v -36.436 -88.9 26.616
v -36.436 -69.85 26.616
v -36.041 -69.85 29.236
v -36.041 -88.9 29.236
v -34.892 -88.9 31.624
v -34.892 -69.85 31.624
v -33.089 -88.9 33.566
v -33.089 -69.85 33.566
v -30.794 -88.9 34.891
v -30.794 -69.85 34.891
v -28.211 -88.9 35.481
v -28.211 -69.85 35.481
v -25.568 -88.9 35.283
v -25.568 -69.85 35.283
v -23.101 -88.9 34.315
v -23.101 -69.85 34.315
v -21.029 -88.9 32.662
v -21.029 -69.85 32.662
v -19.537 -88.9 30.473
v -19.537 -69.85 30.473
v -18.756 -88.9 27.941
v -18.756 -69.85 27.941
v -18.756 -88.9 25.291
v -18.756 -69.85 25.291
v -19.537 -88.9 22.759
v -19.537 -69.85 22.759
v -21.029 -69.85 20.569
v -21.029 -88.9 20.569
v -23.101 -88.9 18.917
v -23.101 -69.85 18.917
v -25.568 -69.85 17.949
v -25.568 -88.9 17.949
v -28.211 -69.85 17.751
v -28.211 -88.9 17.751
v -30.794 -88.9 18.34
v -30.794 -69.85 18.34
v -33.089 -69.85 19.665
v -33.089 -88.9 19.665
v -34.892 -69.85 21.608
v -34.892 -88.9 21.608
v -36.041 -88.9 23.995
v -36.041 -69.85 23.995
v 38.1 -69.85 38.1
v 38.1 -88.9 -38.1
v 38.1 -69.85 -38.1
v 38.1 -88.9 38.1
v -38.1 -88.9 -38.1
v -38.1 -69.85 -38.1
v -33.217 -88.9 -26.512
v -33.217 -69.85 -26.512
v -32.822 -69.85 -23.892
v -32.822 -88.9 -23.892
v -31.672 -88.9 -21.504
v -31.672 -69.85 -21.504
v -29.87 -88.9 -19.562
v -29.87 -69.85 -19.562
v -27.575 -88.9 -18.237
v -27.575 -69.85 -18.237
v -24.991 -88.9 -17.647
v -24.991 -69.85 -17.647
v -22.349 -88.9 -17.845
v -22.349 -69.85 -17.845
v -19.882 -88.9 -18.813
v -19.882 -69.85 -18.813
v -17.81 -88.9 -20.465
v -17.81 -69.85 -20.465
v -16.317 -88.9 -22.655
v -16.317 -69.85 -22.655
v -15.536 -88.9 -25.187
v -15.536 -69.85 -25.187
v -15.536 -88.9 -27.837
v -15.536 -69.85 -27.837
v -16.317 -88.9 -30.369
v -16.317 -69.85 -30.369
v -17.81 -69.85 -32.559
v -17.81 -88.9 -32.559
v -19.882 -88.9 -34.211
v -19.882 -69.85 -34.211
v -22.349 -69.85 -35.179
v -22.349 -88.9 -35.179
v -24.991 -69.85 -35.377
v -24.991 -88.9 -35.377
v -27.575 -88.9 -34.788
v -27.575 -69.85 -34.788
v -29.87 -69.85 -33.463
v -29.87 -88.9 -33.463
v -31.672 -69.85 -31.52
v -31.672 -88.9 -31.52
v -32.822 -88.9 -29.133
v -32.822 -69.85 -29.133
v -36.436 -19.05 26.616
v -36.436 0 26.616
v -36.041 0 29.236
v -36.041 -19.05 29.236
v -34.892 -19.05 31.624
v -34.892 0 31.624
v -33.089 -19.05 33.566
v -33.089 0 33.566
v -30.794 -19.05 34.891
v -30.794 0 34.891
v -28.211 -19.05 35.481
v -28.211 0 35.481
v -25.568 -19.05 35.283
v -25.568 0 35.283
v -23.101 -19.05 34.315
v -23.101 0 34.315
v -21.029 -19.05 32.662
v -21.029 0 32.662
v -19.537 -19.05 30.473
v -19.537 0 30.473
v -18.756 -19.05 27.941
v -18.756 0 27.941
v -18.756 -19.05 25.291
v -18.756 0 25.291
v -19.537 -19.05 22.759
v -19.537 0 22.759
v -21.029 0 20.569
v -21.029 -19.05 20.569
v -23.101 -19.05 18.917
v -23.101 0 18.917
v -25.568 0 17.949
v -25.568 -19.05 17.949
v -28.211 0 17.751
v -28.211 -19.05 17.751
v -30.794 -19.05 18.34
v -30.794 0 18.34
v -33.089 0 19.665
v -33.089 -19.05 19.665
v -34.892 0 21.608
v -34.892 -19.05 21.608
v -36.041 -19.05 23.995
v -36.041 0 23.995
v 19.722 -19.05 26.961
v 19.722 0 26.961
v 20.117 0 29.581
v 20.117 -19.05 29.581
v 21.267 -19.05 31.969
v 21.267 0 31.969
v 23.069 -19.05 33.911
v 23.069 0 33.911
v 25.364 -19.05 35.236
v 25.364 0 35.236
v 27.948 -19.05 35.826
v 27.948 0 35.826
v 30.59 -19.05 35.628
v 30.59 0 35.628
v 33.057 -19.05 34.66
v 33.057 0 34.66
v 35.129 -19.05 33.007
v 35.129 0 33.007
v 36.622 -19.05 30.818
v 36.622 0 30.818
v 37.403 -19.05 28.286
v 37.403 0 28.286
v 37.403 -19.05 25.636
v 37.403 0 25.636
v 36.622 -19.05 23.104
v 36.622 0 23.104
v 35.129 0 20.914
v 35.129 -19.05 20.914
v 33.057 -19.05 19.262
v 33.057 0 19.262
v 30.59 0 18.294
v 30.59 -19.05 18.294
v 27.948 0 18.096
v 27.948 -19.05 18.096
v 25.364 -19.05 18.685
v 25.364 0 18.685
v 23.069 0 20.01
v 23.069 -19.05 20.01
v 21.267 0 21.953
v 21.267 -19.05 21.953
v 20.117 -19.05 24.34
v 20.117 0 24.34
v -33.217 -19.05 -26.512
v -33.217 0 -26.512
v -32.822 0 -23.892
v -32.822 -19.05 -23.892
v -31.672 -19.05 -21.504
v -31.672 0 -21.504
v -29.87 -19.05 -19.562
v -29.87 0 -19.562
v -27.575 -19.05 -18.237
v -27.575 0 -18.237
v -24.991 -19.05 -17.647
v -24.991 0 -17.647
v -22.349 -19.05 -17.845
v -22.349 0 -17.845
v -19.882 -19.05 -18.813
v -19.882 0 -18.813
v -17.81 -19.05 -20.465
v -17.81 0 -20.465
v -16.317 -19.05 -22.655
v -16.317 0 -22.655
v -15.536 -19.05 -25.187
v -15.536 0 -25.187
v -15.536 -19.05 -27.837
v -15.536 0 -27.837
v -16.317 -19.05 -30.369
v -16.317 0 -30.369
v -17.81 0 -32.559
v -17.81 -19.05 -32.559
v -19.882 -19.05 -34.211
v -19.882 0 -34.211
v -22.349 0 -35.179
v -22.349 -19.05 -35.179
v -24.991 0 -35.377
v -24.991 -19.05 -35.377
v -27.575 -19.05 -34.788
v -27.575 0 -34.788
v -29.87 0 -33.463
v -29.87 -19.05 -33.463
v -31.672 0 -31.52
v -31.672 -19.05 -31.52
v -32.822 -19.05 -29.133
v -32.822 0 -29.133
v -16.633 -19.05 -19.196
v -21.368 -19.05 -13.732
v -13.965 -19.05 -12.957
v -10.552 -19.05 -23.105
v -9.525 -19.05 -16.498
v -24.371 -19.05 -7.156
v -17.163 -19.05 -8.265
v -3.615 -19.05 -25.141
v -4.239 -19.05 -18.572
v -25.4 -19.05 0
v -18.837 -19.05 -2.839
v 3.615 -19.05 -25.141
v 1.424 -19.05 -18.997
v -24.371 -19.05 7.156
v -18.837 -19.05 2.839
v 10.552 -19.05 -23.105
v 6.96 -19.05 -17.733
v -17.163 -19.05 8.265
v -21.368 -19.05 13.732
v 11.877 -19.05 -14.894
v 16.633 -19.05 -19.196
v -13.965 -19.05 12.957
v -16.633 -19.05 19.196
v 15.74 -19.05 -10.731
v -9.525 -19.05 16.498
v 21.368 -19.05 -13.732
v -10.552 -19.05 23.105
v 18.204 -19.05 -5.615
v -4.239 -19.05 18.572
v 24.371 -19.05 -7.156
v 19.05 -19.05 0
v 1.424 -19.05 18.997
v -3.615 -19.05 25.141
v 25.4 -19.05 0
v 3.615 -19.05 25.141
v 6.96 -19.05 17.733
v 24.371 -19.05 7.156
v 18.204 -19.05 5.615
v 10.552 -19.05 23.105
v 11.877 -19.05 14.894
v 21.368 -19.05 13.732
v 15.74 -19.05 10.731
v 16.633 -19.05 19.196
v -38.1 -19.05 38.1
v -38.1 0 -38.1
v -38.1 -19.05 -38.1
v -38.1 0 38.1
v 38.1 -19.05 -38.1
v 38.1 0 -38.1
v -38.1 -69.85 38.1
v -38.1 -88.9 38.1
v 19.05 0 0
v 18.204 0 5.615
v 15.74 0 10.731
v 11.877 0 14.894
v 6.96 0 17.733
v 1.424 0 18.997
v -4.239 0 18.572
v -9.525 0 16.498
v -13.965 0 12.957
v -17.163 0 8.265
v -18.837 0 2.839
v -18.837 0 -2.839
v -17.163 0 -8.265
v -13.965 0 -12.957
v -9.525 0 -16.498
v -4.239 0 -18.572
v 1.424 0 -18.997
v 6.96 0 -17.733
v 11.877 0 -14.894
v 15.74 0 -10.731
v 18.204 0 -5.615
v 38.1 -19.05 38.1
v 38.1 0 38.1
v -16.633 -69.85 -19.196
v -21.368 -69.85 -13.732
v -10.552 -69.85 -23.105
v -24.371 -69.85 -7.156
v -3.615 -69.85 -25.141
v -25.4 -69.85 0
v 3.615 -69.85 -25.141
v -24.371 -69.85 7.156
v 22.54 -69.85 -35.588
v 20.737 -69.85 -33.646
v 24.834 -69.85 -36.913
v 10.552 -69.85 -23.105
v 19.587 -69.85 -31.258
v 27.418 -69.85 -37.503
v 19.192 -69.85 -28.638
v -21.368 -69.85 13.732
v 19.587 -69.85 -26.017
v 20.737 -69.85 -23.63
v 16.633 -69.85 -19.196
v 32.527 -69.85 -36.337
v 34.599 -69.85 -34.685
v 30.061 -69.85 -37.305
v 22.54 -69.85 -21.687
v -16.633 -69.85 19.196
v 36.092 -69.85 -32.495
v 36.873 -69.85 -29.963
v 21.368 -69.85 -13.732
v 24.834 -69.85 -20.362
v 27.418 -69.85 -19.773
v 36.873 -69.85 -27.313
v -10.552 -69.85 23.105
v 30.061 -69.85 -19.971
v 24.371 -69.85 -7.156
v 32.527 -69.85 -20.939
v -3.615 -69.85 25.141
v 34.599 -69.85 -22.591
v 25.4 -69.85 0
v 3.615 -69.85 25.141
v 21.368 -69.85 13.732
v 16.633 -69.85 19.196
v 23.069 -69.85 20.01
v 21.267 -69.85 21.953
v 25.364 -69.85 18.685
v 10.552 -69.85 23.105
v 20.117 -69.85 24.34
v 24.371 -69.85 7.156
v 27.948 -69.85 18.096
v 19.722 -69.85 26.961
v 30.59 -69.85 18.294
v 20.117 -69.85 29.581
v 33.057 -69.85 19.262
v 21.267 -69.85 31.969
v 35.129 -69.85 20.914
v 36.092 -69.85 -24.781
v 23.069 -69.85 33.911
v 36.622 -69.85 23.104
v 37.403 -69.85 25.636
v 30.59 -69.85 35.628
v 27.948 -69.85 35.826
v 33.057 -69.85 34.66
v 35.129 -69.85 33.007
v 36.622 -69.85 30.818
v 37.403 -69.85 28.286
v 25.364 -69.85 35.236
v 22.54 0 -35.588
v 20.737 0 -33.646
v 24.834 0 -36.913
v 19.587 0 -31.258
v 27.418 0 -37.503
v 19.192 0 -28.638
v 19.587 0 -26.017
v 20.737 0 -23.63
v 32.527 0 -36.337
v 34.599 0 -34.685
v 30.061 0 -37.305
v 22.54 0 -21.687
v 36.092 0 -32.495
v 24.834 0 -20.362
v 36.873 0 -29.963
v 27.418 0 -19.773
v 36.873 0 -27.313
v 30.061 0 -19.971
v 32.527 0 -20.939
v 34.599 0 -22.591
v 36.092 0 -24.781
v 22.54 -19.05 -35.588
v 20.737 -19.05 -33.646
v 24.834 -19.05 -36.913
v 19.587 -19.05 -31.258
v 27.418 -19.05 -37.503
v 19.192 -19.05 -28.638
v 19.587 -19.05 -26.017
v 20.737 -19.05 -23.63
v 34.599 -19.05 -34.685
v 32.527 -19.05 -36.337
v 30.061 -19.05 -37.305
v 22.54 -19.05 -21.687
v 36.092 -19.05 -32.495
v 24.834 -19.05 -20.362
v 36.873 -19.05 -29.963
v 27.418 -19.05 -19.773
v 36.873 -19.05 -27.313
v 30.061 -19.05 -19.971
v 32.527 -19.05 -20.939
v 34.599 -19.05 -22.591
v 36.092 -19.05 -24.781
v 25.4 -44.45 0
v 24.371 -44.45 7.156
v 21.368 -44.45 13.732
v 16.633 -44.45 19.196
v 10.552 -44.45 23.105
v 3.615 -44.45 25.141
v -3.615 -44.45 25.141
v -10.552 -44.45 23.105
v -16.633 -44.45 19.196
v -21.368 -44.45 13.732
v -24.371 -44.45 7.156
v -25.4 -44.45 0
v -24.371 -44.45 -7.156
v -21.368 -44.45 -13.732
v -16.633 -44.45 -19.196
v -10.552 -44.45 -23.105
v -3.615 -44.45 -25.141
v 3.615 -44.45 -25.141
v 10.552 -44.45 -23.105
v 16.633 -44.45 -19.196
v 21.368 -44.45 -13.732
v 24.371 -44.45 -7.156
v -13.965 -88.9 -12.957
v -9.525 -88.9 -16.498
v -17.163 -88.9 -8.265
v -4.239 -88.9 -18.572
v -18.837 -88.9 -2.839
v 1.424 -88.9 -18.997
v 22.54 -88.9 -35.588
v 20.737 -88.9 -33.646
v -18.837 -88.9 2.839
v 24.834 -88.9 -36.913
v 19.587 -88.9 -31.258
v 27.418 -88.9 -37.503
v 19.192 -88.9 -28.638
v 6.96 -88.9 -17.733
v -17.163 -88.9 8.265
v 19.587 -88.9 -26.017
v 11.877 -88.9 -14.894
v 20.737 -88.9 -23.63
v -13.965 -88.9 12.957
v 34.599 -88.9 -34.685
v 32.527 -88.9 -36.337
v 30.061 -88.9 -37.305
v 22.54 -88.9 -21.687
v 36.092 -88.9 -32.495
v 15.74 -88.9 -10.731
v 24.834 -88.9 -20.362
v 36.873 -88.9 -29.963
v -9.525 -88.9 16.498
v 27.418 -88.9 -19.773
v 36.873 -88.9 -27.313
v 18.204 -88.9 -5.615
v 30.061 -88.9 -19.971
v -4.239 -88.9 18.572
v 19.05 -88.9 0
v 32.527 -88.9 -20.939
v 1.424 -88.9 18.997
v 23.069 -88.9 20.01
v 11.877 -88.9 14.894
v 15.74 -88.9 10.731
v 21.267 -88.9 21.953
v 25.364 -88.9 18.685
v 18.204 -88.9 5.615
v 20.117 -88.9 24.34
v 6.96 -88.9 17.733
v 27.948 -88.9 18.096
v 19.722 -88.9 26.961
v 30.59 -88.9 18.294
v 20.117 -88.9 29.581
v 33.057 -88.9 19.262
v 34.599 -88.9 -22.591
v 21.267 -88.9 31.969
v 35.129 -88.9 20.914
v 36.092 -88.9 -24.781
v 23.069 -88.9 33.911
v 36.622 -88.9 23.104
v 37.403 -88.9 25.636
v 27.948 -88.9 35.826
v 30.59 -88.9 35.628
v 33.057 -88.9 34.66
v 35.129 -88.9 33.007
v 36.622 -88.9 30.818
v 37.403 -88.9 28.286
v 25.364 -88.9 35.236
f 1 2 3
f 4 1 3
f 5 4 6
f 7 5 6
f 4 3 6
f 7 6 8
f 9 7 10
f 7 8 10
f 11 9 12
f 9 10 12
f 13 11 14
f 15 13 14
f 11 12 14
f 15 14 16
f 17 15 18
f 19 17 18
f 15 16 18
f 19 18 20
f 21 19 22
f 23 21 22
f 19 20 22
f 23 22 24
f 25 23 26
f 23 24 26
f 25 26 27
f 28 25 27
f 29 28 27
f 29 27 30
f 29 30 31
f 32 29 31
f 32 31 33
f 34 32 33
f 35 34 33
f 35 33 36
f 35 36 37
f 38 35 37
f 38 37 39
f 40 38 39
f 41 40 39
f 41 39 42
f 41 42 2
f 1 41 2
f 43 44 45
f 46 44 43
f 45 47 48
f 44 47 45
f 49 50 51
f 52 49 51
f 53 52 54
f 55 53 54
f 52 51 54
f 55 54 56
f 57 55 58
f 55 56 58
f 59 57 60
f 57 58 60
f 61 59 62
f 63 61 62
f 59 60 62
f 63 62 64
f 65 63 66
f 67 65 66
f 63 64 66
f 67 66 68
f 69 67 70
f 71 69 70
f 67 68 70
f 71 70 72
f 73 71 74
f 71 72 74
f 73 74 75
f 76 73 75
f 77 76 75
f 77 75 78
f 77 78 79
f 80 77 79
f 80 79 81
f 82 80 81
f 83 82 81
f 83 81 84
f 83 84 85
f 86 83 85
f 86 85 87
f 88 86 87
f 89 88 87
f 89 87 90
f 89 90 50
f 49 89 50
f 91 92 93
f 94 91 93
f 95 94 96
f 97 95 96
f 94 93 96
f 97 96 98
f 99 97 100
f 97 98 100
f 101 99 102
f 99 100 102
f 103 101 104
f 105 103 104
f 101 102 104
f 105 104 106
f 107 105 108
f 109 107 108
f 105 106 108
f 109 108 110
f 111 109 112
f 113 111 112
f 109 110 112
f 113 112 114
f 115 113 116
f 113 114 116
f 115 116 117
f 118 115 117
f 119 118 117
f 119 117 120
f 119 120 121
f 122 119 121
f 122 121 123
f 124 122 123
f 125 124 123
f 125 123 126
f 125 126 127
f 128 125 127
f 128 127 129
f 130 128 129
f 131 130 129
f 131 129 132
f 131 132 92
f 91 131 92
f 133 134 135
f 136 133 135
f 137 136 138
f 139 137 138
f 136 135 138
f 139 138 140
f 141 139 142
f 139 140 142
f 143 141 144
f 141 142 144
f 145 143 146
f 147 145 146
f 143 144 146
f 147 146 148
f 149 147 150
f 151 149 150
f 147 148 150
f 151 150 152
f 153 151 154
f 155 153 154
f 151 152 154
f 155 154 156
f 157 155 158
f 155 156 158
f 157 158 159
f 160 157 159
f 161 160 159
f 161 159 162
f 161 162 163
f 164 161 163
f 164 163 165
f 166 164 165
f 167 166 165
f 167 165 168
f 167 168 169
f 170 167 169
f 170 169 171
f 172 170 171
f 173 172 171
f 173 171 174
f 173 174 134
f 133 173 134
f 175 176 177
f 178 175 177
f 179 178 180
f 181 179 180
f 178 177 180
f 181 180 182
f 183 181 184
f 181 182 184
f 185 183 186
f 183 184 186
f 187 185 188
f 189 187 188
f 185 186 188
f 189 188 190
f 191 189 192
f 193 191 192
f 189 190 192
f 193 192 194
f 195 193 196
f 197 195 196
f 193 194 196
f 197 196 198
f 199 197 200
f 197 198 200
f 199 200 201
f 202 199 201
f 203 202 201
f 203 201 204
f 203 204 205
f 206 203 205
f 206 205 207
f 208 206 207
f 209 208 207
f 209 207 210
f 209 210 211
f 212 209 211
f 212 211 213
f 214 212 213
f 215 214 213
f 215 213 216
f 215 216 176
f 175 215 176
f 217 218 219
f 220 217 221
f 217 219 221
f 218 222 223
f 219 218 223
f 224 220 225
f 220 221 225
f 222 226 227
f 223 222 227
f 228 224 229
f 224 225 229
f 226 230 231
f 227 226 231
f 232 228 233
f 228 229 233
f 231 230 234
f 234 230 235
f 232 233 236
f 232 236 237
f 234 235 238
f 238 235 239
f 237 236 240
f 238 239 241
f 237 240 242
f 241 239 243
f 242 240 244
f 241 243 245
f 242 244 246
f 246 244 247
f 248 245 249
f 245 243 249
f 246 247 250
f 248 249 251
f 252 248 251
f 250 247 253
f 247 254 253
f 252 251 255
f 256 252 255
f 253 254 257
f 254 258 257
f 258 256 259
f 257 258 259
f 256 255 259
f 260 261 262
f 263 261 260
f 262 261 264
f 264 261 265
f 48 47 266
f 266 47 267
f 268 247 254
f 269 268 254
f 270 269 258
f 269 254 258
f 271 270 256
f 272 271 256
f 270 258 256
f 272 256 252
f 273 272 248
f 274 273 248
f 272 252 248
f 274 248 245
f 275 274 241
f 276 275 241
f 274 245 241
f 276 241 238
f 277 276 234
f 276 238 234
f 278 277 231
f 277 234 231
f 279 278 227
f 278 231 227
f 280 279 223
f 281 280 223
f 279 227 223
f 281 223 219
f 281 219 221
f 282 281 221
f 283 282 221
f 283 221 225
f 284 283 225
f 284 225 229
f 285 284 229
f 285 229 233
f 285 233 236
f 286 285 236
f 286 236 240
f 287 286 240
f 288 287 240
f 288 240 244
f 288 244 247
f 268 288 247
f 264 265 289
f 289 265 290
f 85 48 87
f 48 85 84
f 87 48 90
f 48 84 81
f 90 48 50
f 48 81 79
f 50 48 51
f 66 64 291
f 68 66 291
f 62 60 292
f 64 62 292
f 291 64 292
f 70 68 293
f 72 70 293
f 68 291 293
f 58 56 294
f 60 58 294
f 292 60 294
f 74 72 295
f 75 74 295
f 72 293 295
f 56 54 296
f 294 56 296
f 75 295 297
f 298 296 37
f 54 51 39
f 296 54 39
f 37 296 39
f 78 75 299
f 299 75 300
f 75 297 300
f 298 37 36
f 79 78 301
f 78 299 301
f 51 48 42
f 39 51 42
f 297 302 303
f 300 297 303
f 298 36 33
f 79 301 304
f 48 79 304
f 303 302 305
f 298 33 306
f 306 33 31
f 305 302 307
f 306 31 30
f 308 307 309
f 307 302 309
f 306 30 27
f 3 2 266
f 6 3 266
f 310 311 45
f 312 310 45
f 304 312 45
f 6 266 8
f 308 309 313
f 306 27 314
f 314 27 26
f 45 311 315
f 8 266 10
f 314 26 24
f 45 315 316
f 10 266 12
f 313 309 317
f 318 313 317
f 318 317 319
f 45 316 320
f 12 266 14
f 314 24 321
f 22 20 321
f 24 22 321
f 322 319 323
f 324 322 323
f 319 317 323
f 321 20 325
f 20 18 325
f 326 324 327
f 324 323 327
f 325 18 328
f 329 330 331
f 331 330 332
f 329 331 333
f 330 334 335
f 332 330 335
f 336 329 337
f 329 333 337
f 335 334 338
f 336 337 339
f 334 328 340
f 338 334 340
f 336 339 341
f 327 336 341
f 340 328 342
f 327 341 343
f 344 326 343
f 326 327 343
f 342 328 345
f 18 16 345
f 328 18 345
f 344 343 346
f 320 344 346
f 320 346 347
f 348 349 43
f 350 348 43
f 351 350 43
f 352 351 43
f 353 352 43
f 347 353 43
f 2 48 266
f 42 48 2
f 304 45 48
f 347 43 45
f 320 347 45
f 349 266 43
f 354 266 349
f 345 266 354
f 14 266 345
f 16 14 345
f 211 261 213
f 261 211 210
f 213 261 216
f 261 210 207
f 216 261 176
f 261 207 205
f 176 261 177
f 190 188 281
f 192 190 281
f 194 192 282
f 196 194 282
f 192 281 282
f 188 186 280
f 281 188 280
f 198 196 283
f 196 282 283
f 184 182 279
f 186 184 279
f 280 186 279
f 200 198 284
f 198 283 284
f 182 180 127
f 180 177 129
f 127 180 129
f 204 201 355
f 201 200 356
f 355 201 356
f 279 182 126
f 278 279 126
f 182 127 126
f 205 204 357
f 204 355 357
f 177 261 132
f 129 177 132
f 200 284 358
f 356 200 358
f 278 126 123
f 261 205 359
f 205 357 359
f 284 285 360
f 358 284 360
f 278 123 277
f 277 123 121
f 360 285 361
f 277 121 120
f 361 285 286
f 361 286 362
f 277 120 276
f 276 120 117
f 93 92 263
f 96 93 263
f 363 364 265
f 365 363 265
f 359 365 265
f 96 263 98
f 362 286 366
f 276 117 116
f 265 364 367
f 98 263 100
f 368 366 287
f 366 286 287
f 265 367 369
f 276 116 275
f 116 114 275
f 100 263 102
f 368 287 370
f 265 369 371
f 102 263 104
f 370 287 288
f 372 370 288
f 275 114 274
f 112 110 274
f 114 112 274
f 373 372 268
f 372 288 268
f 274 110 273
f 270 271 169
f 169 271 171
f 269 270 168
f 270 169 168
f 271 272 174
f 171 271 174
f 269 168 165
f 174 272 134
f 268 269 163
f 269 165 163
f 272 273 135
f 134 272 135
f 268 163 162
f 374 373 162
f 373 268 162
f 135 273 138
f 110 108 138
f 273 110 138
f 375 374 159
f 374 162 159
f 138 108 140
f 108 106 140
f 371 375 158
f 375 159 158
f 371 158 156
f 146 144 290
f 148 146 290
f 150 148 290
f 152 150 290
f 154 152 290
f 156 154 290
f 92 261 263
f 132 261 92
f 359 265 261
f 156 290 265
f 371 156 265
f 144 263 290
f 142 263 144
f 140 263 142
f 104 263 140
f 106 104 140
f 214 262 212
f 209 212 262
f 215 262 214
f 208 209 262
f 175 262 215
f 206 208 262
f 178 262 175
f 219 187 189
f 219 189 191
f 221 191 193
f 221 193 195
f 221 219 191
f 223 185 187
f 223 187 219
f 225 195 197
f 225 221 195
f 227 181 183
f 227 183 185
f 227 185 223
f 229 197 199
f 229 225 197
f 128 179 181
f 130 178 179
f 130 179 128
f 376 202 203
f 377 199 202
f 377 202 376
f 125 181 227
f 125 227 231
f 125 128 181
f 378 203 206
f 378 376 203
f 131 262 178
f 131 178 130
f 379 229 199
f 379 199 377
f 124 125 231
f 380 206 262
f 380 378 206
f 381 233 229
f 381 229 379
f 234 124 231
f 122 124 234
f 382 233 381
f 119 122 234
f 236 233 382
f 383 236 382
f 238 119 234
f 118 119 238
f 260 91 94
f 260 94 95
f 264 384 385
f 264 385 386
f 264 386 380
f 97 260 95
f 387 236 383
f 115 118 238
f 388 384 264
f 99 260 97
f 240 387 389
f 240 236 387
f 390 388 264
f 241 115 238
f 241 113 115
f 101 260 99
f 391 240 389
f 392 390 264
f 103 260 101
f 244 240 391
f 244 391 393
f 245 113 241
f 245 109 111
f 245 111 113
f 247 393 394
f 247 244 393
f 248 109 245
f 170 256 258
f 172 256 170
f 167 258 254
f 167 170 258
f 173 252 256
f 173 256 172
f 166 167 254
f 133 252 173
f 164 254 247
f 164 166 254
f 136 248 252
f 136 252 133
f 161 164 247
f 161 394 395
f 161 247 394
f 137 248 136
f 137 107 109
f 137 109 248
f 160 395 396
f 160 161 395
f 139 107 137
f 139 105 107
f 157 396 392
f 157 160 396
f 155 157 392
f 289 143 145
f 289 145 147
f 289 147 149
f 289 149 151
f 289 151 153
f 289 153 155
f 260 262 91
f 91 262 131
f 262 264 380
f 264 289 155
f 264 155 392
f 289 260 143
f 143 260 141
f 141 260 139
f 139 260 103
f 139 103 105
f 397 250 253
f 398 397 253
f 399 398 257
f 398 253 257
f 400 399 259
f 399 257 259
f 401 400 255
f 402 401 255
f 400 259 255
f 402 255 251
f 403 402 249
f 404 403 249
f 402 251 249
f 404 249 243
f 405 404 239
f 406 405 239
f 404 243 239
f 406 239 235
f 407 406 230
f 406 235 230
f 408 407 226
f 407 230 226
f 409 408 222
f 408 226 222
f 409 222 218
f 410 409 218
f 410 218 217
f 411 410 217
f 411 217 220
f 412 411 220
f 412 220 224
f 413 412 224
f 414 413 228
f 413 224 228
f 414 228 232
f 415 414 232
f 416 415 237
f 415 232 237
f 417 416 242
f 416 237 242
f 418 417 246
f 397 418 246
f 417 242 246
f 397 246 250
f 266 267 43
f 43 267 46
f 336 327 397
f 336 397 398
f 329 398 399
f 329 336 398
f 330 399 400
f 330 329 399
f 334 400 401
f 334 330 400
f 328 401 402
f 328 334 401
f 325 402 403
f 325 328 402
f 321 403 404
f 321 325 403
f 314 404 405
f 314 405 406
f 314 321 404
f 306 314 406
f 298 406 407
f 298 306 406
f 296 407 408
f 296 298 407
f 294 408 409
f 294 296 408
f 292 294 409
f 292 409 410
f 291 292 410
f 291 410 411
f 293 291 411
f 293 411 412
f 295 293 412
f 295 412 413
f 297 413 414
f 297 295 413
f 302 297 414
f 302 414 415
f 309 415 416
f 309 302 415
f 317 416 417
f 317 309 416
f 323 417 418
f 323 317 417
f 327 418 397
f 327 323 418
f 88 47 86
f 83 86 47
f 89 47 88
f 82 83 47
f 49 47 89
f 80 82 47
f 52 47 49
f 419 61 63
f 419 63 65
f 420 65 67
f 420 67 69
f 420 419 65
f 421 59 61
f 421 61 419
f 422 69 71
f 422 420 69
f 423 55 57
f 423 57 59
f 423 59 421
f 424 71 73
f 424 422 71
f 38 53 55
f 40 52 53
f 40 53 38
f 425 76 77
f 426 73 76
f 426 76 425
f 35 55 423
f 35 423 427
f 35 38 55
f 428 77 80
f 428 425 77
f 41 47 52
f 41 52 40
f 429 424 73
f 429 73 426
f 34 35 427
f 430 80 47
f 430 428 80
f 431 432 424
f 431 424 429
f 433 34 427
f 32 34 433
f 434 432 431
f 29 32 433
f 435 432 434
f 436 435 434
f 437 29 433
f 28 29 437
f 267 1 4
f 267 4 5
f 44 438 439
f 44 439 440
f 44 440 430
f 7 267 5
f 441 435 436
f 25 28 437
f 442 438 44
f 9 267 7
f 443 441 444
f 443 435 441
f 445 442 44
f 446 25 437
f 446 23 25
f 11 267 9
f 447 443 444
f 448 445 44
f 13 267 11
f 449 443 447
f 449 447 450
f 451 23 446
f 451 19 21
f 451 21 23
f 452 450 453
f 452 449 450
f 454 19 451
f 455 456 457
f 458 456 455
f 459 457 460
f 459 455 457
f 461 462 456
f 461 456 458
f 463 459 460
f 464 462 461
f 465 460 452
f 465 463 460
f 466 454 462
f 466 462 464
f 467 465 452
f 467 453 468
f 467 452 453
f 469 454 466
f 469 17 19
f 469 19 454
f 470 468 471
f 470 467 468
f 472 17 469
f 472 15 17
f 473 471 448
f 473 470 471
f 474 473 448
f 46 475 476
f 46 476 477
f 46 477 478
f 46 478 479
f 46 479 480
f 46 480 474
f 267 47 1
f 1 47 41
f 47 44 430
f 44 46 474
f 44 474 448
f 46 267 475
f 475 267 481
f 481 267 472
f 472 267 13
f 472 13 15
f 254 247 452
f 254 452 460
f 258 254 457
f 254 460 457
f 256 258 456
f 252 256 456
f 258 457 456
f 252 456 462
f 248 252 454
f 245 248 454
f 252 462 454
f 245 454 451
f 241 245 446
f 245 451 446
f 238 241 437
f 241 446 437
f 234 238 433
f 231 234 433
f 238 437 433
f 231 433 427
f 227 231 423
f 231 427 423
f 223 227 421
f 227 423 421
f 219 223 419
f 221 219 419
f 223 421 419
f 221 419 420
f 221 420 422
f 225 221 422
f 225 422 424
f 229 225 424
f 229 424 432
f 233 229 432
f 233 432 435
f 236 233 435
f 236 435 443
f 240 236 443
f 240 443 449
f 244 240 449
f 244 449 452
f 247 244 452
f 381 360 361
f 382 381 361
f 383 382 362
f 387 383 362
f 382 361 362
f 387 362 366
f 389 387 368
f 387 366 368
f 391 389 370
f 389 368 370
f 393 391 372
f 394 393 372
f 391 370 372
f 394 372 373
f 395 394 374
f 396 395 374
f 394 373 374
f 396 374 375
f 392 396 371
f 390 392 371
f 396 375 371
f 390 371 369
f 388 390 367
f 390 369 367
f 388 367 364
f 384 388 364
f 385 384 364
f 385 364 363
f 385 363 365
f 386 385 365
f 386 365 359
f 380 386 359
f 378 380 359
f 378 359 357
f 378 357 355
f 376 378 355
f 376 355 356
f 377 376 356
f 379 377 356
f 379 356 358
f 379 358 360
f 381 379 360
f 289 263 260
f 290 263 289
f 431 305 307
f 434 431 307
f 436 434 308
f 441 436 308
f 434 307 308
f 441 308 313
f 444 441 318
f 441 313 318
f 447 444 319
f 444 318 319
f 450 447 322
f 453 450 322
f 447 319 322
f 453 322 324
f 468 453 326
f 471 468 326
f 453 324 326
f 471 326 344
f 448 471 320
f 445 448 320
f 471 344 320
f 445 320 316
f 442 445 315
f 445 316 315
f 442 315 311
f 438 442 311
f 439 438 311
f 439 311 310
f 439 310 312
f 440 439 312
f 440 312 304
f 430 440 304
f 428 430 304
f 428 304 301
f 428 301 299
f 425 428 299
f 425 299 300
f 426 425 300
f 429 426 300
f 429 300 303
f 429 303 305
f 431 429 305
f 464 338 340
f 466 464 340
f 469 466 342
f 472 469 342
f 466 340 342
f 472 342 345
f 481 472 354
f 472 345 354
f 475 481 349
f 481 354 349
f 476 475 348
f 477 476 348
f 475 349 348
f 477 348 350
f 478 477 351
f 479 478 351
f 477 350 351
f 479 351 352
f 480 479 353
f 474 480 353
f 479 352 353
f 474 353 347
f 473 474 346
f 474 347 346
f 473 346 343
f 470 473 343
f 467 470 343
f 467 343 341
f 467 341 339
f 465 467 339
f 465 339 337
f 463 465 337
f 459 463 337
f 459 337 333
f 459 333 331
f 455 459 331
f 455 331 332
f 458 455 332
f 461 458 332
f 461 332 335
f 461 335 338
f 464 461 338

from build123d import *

# Parameters (mm, degrees)
F0_W     = 76.2
F0_H     = 76.2
F1_DEPTH = 19.05
F2_R     = 25.4
F3_DEPTH = 25.4
F6_D     = 38.1
F6_2_D   = 38.1
F8_D     = 17.78
F8_2_D   = 17.78
F10_D    = 17.78
F10_2_D  = 17.78
F12_D    = 17.78
F12_2_D  = 17.78
F14_D    = 17.78
F14_2_D  = 17.78


with BuildPart() as f1:
    # F0 (on Front) → F1 (new body)
    with BuildSketch(Plane.XZ):
        Rectangle(F0_W, F0_H)
    extrude(amount=F1_DEPTH)


with BuildPart() as f3:
    # F2 (on face) → F3 (new body)
    with BuildSketch(Plane.XZ.offset(19.05)):
        Circle(F2_R)
    extrude(amount=F3_DEPTH)



with BuildPart() as f3_1:
    add(f3.part)
    # F5: F1, F3 across face
    add(f1.part.mirror(Plane.XZ.offset(44.45)))
    add(f3.part.mirror(Plane.XZ.offset(44.45)))

    # F6#2 (through all)
    with Locations(Plane(origin=(0, 0, 0), x_dir=(-1, 0, 0), z_dir=(0, 1, 0))):
        with Locations((0, 0)):
            Hole(F6_2_D / 2)

    # F8#2 (through all)
    with Locations(Plane.XZ.offset(88.9)):
        with Locations((28.0823782086, -28.6378357559)):
            Hole(F8_2_D / 2)

    # F10#2 (through all)
    with Locations(Plane.XZ.offset(88.9)):
        with Locations((-24.3268366903, -26.5121720731)):
            Hole(F10_2_D / 2)

    # F12#2 (through all)
    with Locations(Plane.XZ.offset(88.9)):
        with Locations((28.6120604724, 26.9607454538)):
            Hole(F12_2_D / 2)

    # F14#2 (through all)
    with Locations(Plane.XZ.offset(88.9)):
        with Locations((-27.5462884456, 26.6157463193)):
            Hole(F14_2_D / 2)


with BuildPart() as f1_1:
    add(f1.part)

    # F6 (through all)
    with Locations(Plane(origin=(0, 0, 0), x_dir=(-1, 0, 0), z_dir=(0, 1, 0))):
        with Locations((0, 0)):
            Hole(F6_D / 2)

    # F8 (through all)
    with Locations(Plane.XZ.offset(88.9)):
        with Locations((28.0823782086, -28.6378357559)):
            Hole(F8_D / 2)

    # F10 (through all)
    with Locations(Plane.XZ.offset(88.9)):
        with Locations((-24.3268366903, -26.5121720731)):
            Hole(F10_D / 2)

    # F12 (through all)
    with Locations(Plane.XZ.offset(88.9)):
        with Locations((28.6120604724, 26.9607454538)):
            Hole(F12_D / 2)

    # F14 (through all)
    with Locations(Plane.XZ.offset(88.9)):
        with Locations((-27.5462884456, 26.6157463193)):
            Hole(F14_D / 2)


solid = Compound([f3_1.part, f1_1.part])
